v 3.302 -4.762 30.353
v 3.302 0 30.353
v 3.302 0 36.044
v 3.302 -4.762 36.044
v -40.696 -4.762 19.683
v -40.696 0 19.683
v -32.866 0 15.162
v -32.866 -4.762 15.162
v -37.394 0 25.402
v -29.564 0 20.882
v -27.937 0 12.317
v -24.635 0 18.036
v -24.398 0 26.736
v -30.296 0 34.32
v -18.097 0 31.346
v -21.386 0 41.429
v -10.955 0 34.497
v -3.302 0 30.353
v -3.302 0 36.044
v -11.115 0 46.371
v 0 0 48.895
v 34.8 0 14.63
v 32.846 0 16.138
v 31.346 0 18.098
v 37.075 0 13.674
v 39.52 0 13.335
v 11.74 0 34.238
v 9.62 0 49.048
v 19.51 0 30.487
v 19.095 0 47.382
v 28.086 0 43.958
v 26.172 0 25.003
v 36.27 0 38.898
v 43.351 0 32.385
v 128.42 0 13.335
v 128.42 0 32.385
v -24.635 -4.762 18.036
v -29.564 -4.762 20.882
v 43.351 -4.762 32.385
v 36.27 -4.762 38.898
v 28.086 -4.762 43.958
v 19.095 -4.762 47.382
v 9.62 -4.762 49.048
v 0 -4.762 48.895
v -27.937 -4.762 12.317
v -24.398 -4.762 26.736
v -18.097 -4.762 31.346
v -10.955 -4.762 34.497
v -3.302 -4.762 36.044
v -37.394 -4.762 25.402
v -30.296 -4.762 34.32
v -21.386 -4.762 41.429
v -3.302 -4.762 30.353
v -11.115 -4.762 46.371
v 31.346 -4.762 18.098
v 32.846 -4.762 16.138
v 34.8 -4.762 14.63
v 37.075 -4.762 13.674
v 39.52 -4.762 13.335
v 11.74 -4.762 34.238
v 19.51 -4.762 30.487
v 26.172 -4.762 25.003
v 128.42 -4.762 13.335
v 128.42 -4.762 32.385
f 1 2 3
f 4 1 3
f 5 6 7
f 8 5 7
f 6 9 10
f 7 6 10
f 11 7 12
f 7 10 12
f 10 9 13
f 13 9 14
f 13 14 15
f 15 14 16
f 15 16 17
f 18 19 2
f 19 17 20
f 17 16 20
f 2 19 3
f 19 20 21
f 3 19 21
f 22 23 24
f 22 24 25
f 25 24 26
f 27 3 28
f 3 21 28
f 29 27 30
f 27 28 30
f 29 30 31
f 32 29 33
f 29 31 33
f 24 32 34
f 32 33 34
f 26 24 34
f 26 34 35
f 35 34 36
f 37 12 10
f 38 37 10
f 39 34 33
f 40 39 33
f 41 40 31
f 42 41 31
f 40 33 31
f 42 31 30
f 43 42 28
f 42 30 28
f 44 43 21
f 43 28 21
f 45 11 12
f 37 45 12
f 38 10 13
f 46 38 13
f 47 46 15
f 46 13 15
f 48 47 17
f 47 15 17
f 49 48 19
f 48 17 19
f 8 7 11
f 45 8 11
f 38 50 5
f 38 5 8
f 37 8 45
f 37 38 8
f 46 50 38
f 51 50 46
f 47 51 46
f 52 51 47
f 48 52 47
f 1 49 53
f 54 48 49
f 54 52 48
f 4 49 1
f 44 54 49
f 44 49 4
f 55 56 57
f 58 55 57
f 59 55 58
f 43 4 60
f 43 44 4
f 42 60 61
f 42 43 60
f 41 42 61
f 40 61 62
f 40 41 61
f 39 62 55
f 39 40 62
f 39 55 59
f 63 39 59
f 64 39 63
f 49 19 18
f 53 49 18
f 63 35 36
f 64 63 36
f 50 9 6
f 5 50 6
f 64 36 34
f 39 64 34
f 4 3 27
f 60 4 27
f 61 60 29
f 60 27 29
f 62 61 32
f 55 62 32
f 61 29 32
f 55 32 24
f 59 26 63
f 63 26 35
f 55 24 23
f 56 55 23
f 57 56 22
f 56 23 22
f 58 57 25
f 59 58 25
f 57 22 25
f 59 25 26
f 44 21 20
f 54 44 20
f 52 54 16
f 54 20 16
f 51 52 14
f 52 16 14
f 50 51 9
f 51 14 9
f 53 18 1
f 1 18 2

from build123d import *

# Parameters (mm, degrees)
F1_DEPTH = 4.7625


with BuildPart() as f1:
    # F0 (on Front) → F1 (new body)
    with BuildSketch(Plane.XZ):
        with BuildLine():
            ThreePointArc((43.350956, 32.385296), (43.963334, 31.69148), (44.562959, 30.986613))
            ThreePointArc((44.562959, 30.986613), (47.902764, 27.518475), (49.119681, 22.86))
            ThreePointArc((49.119681, 22.86), (46.35636, 16.151399), (39.669743, 13.335296))
            Line((39.669743, 13.335296), (128.41962, 13.335296))
            Line((128.41962, 13.335296), (128.41962, 32.385296))
            Line((128.41962, 32.385296), (43.350956, 32.385296))
        make_face()
        with BuildLine():
            ThreePointArc((44.562959, 30.986613), (32.94465, 29.679289), (31.345789, 18.0975))
            ThreePointArc((31.345789, 18.0975), (34.799716, 14.629938), (39.51962, 13.335296))
            Line((39.51962, 13.335296), (39.669743, 13.335296))
            ThreePointArc((39.669743, 13.335296), (46.35636, 16.151399), (49.119681, 22.86))
            ThreePointArc((49.119681, 22.86), (47.902764, 27.518475), (44.562959, 30.986613))
        make_face()
        with BuildLine():
            ThreePointArc((3.302, 36.044068), (19.509924, 30.486733), (31.345789, 18.0975))
            ThreePointArc((31.345789, 18.0975), (32.94465, 29.679289), (44.562959, 30.986613))
            ThreePointArc((44.562959, 30.986613), (43.963334, 31.69148), (43.350956, 32.385296))
            ThreePointArc((43.350956, 32.385296), (23.672268, 45.883291), (0, 48.895))
            Line((0, 48.895), (0, 36.195))
            ThreePointArc((0, 36.195), (1.652724, 36.157247), (3.302, 36.044068))
        make_face()
        with BuildLine():
            ThreePointArc((-3.302, 36.044068), (-1.652724, 36.157247), (0, 36.195))
            Line((0, 36.195), (0, 48.895))
            ThreePointArc((0, 48.895), (-21.386272, 41.429282), (-37.393755, 25.402116))
            Line((-37.393755, 25.402116), (-29.564078, 20.88165))
            ThreePointArc((-29.564078, 20.88165), (-18.0975, 31.345789), (-3.302, 36.044068))
        make_face()
        Polygon((-32.866078, 15.162418), (-37.393755, 25.402116), (-40.695755, 19.682884), align=None)
        with BuildLine():
            ThreePointArc((-32.866078, 15.162418), (-32.139457, 16.647323), (-31.345789, 18.0975))
            ThreePointArc((-31.345789, 18.0975), (-30.486733, 19.509924), (-29.564078, 20.88165))
            Line((-29.564078, 20.88165), (-37.393755, 25.402116))
            Line((-37.393755, 25.402116), (-32.866078, 15.162418))
        make_face()
        with BuildLine():
            Line((-31.345789, 18.0975), (-26.286469, 15.1765))
            Line((-26.286469, 15.1765), (-24.635469, 18.036116))
            Line((-24.635469, 18.036116), (-29.564078, 20.88165))
            ThreePointArc((-29.564078, 20.88165), (-30.486733, 19.509924), (-31.345789, 18.0975))
        make_face()
        with BuildLine():
            Line((-27.937469, 12.316884), (-26.286469, 15.1765))
            Line((-26.286469, 15.1765), (-31.345789, 18.0975))
            ThreePointArc((-31.345789, 18.0975), (-32.139457, 16.647323), (-32.866078, 15.162418))
            Line((-32.866078, 15.162418), (-27.937469, 12.316884))
        make_face()
        with BuildLine():
            Line((0, 30.353), (0, 36.195))
            ThreePointArc((0, 36.195), (-1.652724, 36.157247), (-3.302, 36.044068))
            Line((-3.302, 36.044068), (-3.302, 30.353))
            Line((-3.302, 30.353), (0, 30.353))
        make_face()
        with BuildLine():
            Line((3.302, 30.353), (3.302, 36.044068))
            ThreePointArc((3.302, 36.044068), (1.652724, 36.157247), (0, 36.195))
            Line((0, 36.195), (0, 30.353))
            Line((0, 30.353), (3.302, 30.353))
        make_face()
    extrude(amount=F1_DEPTH)


solid = f1.part
